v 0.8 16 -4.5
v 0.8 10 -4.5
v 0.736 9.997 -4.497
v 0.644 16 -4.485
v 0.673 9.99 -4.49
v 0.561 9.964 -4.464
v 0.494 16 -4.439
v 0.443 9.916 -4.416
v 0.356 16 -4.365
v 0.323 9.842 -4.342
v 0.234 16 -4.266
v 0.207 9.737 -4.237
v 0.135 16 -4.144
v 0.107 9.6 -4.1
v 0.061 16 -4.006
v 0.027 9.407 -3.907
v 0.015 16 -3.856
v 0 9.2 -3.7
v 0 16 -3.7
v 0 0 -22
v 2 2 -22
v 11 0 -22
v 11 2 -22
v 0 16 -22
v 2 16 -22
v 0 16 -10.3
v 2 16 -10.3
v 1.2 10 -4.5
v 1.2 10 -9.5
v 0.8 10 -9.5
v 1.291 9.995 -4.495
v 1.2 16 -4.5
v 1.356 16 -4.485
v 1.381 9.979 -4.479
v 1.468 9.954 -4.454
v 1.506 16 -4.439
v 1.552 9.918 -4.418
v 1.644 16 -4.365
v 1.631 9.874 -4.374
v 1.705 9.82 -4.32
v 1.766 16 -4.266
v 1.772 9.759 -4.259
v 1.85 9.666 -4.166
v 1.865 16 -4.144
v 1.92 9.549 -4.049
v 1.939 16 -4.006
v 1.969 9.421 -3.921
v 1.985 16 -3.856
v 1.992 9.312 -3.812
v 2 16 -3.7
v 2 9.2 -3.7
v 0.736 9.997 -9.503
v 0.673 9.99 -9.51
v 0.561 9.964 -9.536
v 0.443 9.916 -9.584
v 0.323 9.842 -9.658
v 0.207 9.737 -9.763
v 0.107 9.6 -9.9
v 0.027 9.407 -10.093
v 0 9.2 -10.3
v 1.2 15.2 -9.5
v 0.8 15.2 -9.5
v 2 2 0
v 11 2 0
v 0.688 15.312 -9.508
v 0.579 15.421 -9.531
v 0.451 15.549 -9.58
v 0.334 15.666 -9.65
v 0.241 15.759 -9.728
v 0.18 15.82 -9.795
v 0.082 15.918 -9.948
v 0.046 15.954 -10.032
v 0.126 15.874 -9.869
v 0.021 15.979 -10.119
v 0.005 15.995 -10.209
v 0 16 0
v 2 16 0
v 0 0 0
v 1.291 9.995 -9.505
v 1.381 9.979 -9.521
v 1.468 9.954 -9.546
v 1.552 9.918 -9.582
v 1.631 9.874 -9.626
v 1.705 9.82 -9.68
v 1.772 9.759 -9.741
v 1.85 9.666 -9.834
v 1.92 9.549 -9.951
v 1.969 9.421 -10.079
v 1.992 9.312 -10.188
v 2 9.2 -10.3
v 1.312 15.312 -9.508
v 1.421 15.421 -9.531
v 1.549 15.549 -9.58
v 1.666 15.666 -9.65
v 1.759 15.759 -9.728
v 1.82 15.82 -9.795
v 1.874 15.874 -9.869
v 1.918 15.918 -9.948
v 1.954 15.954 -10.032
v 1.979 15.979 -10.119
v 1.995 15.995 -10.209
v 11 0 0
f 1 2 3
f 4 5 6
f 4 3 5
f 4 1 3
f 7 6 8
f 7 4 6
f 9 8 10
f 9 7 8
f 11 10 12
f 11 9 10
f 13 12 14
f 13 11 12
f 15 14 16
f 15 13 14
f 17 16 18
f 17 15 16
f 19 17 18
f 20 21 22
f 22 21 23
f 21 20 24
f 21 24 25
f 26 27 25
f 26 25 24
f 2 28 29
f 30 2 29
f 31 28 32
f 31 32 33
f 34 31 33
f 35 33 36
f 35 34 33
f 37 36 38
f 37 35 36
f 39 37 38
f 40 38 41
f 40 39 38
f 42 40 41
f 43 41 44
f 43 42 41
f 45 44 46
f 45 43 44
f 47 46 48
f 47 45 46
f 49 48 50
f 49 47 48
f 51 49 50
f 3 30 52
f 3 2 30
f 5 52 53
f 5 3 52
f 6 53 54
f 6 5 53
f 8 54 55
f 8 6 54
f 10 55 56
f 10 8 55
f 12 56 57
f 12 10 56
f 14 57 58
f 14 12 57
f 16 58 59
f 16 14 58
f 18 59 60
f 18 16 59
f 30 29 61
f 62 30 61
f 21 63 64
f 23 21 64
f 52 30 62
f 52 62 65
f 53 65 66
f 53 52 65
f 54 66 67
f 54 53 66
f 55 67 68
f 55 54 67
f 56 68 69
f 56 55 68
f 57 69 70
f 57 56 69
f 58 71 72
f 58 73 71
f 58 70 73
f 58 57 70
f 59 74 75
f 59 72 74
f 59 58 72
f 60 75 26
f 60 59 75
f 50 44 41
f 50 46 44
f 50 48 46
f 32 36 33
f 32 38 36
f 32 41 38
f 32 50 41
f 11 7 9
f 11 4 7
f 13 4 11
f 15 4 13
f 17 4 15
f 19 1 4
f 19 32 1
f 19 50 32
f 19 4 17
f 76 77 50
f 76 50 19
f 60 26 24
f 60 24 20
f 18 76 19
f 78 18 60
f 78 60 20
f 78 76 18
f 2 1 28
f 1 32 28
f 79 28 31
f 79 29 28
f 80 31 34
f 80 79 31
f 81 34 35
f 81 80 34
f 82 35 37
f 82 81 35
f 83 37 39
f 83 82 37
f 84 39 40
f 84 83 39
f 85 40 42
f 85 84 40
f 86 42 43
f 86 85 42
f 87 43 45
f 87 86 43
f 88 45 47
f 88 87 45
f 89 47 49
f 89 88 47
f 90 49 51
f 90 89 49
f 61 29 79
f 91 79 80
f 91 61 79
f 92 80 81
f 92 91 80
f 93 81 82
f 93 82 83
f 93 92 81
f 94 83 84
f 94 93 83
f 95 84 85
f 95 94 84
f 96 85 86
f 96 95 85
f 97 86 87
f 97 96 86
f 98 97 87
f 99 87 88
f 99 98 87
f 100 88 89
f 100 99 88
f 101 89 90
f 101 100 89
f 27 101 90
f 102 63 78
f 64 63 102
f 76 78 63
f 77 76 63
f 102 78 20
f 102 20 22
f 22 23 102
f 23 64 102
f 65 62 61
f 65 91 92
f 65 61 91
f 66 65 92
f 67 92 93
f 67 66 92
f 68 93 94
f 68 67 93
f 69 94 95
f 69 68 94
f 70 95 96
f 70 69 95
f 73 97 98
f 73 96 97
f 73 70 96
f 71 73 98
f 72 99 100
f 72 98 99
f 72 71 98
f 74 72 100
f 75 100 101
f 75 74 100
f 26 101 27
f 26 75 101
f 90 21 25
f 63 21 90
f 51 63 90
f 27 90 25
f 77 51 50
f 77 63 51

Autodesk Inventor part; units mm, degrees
ref_plane "YZ Plane" through (0, 0, 0) normal (1, 0, 0) x (0, 1, 0)
ref_plane "XZ Plane" through (0, 0, 0) normal (0, 1, 0) x (-1, 0, 0)
ref_plane "XY Plane" through (0, 0, 0) normal (0, 0, 1) x (1, 0, 0)
sketch "Sketch1" plane through (0, 0, 0) normal (0, 0, 1) x (1, 0, 0)
  line L0 (0, 0) -> (2, 0)
  line L1 (2, 0) -> (2, 16)
  line L2 (2, 16) -> (0, 16)
  line L3 (0, 16) -> (0, 0)
  line L4 (2, 2) -> (11, 2)
  line L5 (11, 2) -> (11, 0)
  line L6 (11, 0) -> (2, 0)
  line L7 (2, 0) -> (2, 2)
  dimension "d0" = 2
  dimension "d1" = 16
  dimension "d2" = 9
extrude "Extrusion1" add sketch "Sketch1" against normal blind 22
sketch "Sketch3" plane through (2, 2, 0) normal (1, 0, 0) x (0, 0, -1)
  line L0 (9.5, 14) -> (4.5, 14)
  line L1 (4.5, 14) -> (4.5, 8)
  line L2 (4.5, 8) -> (9.5, 8)
  line L3 (9.5, 8) -> (9.5, 14)
  point P0 (0, -2)
  dimension "d9" = 5
  dimension "d10" = 6
extrude "Extrusion3" cut sketch "Sketch3" against normal blind 10
fillet "Fillet1" radius 0.8 7 edges at (2, 10, -7) (0, 10, -7) (1, 16, -9.5) (2, 13, -9.5) (0, 13, -9.5) (2, 13, -4.5) (0, 13, -4.5)
properties part number "housing_mate_v08"
